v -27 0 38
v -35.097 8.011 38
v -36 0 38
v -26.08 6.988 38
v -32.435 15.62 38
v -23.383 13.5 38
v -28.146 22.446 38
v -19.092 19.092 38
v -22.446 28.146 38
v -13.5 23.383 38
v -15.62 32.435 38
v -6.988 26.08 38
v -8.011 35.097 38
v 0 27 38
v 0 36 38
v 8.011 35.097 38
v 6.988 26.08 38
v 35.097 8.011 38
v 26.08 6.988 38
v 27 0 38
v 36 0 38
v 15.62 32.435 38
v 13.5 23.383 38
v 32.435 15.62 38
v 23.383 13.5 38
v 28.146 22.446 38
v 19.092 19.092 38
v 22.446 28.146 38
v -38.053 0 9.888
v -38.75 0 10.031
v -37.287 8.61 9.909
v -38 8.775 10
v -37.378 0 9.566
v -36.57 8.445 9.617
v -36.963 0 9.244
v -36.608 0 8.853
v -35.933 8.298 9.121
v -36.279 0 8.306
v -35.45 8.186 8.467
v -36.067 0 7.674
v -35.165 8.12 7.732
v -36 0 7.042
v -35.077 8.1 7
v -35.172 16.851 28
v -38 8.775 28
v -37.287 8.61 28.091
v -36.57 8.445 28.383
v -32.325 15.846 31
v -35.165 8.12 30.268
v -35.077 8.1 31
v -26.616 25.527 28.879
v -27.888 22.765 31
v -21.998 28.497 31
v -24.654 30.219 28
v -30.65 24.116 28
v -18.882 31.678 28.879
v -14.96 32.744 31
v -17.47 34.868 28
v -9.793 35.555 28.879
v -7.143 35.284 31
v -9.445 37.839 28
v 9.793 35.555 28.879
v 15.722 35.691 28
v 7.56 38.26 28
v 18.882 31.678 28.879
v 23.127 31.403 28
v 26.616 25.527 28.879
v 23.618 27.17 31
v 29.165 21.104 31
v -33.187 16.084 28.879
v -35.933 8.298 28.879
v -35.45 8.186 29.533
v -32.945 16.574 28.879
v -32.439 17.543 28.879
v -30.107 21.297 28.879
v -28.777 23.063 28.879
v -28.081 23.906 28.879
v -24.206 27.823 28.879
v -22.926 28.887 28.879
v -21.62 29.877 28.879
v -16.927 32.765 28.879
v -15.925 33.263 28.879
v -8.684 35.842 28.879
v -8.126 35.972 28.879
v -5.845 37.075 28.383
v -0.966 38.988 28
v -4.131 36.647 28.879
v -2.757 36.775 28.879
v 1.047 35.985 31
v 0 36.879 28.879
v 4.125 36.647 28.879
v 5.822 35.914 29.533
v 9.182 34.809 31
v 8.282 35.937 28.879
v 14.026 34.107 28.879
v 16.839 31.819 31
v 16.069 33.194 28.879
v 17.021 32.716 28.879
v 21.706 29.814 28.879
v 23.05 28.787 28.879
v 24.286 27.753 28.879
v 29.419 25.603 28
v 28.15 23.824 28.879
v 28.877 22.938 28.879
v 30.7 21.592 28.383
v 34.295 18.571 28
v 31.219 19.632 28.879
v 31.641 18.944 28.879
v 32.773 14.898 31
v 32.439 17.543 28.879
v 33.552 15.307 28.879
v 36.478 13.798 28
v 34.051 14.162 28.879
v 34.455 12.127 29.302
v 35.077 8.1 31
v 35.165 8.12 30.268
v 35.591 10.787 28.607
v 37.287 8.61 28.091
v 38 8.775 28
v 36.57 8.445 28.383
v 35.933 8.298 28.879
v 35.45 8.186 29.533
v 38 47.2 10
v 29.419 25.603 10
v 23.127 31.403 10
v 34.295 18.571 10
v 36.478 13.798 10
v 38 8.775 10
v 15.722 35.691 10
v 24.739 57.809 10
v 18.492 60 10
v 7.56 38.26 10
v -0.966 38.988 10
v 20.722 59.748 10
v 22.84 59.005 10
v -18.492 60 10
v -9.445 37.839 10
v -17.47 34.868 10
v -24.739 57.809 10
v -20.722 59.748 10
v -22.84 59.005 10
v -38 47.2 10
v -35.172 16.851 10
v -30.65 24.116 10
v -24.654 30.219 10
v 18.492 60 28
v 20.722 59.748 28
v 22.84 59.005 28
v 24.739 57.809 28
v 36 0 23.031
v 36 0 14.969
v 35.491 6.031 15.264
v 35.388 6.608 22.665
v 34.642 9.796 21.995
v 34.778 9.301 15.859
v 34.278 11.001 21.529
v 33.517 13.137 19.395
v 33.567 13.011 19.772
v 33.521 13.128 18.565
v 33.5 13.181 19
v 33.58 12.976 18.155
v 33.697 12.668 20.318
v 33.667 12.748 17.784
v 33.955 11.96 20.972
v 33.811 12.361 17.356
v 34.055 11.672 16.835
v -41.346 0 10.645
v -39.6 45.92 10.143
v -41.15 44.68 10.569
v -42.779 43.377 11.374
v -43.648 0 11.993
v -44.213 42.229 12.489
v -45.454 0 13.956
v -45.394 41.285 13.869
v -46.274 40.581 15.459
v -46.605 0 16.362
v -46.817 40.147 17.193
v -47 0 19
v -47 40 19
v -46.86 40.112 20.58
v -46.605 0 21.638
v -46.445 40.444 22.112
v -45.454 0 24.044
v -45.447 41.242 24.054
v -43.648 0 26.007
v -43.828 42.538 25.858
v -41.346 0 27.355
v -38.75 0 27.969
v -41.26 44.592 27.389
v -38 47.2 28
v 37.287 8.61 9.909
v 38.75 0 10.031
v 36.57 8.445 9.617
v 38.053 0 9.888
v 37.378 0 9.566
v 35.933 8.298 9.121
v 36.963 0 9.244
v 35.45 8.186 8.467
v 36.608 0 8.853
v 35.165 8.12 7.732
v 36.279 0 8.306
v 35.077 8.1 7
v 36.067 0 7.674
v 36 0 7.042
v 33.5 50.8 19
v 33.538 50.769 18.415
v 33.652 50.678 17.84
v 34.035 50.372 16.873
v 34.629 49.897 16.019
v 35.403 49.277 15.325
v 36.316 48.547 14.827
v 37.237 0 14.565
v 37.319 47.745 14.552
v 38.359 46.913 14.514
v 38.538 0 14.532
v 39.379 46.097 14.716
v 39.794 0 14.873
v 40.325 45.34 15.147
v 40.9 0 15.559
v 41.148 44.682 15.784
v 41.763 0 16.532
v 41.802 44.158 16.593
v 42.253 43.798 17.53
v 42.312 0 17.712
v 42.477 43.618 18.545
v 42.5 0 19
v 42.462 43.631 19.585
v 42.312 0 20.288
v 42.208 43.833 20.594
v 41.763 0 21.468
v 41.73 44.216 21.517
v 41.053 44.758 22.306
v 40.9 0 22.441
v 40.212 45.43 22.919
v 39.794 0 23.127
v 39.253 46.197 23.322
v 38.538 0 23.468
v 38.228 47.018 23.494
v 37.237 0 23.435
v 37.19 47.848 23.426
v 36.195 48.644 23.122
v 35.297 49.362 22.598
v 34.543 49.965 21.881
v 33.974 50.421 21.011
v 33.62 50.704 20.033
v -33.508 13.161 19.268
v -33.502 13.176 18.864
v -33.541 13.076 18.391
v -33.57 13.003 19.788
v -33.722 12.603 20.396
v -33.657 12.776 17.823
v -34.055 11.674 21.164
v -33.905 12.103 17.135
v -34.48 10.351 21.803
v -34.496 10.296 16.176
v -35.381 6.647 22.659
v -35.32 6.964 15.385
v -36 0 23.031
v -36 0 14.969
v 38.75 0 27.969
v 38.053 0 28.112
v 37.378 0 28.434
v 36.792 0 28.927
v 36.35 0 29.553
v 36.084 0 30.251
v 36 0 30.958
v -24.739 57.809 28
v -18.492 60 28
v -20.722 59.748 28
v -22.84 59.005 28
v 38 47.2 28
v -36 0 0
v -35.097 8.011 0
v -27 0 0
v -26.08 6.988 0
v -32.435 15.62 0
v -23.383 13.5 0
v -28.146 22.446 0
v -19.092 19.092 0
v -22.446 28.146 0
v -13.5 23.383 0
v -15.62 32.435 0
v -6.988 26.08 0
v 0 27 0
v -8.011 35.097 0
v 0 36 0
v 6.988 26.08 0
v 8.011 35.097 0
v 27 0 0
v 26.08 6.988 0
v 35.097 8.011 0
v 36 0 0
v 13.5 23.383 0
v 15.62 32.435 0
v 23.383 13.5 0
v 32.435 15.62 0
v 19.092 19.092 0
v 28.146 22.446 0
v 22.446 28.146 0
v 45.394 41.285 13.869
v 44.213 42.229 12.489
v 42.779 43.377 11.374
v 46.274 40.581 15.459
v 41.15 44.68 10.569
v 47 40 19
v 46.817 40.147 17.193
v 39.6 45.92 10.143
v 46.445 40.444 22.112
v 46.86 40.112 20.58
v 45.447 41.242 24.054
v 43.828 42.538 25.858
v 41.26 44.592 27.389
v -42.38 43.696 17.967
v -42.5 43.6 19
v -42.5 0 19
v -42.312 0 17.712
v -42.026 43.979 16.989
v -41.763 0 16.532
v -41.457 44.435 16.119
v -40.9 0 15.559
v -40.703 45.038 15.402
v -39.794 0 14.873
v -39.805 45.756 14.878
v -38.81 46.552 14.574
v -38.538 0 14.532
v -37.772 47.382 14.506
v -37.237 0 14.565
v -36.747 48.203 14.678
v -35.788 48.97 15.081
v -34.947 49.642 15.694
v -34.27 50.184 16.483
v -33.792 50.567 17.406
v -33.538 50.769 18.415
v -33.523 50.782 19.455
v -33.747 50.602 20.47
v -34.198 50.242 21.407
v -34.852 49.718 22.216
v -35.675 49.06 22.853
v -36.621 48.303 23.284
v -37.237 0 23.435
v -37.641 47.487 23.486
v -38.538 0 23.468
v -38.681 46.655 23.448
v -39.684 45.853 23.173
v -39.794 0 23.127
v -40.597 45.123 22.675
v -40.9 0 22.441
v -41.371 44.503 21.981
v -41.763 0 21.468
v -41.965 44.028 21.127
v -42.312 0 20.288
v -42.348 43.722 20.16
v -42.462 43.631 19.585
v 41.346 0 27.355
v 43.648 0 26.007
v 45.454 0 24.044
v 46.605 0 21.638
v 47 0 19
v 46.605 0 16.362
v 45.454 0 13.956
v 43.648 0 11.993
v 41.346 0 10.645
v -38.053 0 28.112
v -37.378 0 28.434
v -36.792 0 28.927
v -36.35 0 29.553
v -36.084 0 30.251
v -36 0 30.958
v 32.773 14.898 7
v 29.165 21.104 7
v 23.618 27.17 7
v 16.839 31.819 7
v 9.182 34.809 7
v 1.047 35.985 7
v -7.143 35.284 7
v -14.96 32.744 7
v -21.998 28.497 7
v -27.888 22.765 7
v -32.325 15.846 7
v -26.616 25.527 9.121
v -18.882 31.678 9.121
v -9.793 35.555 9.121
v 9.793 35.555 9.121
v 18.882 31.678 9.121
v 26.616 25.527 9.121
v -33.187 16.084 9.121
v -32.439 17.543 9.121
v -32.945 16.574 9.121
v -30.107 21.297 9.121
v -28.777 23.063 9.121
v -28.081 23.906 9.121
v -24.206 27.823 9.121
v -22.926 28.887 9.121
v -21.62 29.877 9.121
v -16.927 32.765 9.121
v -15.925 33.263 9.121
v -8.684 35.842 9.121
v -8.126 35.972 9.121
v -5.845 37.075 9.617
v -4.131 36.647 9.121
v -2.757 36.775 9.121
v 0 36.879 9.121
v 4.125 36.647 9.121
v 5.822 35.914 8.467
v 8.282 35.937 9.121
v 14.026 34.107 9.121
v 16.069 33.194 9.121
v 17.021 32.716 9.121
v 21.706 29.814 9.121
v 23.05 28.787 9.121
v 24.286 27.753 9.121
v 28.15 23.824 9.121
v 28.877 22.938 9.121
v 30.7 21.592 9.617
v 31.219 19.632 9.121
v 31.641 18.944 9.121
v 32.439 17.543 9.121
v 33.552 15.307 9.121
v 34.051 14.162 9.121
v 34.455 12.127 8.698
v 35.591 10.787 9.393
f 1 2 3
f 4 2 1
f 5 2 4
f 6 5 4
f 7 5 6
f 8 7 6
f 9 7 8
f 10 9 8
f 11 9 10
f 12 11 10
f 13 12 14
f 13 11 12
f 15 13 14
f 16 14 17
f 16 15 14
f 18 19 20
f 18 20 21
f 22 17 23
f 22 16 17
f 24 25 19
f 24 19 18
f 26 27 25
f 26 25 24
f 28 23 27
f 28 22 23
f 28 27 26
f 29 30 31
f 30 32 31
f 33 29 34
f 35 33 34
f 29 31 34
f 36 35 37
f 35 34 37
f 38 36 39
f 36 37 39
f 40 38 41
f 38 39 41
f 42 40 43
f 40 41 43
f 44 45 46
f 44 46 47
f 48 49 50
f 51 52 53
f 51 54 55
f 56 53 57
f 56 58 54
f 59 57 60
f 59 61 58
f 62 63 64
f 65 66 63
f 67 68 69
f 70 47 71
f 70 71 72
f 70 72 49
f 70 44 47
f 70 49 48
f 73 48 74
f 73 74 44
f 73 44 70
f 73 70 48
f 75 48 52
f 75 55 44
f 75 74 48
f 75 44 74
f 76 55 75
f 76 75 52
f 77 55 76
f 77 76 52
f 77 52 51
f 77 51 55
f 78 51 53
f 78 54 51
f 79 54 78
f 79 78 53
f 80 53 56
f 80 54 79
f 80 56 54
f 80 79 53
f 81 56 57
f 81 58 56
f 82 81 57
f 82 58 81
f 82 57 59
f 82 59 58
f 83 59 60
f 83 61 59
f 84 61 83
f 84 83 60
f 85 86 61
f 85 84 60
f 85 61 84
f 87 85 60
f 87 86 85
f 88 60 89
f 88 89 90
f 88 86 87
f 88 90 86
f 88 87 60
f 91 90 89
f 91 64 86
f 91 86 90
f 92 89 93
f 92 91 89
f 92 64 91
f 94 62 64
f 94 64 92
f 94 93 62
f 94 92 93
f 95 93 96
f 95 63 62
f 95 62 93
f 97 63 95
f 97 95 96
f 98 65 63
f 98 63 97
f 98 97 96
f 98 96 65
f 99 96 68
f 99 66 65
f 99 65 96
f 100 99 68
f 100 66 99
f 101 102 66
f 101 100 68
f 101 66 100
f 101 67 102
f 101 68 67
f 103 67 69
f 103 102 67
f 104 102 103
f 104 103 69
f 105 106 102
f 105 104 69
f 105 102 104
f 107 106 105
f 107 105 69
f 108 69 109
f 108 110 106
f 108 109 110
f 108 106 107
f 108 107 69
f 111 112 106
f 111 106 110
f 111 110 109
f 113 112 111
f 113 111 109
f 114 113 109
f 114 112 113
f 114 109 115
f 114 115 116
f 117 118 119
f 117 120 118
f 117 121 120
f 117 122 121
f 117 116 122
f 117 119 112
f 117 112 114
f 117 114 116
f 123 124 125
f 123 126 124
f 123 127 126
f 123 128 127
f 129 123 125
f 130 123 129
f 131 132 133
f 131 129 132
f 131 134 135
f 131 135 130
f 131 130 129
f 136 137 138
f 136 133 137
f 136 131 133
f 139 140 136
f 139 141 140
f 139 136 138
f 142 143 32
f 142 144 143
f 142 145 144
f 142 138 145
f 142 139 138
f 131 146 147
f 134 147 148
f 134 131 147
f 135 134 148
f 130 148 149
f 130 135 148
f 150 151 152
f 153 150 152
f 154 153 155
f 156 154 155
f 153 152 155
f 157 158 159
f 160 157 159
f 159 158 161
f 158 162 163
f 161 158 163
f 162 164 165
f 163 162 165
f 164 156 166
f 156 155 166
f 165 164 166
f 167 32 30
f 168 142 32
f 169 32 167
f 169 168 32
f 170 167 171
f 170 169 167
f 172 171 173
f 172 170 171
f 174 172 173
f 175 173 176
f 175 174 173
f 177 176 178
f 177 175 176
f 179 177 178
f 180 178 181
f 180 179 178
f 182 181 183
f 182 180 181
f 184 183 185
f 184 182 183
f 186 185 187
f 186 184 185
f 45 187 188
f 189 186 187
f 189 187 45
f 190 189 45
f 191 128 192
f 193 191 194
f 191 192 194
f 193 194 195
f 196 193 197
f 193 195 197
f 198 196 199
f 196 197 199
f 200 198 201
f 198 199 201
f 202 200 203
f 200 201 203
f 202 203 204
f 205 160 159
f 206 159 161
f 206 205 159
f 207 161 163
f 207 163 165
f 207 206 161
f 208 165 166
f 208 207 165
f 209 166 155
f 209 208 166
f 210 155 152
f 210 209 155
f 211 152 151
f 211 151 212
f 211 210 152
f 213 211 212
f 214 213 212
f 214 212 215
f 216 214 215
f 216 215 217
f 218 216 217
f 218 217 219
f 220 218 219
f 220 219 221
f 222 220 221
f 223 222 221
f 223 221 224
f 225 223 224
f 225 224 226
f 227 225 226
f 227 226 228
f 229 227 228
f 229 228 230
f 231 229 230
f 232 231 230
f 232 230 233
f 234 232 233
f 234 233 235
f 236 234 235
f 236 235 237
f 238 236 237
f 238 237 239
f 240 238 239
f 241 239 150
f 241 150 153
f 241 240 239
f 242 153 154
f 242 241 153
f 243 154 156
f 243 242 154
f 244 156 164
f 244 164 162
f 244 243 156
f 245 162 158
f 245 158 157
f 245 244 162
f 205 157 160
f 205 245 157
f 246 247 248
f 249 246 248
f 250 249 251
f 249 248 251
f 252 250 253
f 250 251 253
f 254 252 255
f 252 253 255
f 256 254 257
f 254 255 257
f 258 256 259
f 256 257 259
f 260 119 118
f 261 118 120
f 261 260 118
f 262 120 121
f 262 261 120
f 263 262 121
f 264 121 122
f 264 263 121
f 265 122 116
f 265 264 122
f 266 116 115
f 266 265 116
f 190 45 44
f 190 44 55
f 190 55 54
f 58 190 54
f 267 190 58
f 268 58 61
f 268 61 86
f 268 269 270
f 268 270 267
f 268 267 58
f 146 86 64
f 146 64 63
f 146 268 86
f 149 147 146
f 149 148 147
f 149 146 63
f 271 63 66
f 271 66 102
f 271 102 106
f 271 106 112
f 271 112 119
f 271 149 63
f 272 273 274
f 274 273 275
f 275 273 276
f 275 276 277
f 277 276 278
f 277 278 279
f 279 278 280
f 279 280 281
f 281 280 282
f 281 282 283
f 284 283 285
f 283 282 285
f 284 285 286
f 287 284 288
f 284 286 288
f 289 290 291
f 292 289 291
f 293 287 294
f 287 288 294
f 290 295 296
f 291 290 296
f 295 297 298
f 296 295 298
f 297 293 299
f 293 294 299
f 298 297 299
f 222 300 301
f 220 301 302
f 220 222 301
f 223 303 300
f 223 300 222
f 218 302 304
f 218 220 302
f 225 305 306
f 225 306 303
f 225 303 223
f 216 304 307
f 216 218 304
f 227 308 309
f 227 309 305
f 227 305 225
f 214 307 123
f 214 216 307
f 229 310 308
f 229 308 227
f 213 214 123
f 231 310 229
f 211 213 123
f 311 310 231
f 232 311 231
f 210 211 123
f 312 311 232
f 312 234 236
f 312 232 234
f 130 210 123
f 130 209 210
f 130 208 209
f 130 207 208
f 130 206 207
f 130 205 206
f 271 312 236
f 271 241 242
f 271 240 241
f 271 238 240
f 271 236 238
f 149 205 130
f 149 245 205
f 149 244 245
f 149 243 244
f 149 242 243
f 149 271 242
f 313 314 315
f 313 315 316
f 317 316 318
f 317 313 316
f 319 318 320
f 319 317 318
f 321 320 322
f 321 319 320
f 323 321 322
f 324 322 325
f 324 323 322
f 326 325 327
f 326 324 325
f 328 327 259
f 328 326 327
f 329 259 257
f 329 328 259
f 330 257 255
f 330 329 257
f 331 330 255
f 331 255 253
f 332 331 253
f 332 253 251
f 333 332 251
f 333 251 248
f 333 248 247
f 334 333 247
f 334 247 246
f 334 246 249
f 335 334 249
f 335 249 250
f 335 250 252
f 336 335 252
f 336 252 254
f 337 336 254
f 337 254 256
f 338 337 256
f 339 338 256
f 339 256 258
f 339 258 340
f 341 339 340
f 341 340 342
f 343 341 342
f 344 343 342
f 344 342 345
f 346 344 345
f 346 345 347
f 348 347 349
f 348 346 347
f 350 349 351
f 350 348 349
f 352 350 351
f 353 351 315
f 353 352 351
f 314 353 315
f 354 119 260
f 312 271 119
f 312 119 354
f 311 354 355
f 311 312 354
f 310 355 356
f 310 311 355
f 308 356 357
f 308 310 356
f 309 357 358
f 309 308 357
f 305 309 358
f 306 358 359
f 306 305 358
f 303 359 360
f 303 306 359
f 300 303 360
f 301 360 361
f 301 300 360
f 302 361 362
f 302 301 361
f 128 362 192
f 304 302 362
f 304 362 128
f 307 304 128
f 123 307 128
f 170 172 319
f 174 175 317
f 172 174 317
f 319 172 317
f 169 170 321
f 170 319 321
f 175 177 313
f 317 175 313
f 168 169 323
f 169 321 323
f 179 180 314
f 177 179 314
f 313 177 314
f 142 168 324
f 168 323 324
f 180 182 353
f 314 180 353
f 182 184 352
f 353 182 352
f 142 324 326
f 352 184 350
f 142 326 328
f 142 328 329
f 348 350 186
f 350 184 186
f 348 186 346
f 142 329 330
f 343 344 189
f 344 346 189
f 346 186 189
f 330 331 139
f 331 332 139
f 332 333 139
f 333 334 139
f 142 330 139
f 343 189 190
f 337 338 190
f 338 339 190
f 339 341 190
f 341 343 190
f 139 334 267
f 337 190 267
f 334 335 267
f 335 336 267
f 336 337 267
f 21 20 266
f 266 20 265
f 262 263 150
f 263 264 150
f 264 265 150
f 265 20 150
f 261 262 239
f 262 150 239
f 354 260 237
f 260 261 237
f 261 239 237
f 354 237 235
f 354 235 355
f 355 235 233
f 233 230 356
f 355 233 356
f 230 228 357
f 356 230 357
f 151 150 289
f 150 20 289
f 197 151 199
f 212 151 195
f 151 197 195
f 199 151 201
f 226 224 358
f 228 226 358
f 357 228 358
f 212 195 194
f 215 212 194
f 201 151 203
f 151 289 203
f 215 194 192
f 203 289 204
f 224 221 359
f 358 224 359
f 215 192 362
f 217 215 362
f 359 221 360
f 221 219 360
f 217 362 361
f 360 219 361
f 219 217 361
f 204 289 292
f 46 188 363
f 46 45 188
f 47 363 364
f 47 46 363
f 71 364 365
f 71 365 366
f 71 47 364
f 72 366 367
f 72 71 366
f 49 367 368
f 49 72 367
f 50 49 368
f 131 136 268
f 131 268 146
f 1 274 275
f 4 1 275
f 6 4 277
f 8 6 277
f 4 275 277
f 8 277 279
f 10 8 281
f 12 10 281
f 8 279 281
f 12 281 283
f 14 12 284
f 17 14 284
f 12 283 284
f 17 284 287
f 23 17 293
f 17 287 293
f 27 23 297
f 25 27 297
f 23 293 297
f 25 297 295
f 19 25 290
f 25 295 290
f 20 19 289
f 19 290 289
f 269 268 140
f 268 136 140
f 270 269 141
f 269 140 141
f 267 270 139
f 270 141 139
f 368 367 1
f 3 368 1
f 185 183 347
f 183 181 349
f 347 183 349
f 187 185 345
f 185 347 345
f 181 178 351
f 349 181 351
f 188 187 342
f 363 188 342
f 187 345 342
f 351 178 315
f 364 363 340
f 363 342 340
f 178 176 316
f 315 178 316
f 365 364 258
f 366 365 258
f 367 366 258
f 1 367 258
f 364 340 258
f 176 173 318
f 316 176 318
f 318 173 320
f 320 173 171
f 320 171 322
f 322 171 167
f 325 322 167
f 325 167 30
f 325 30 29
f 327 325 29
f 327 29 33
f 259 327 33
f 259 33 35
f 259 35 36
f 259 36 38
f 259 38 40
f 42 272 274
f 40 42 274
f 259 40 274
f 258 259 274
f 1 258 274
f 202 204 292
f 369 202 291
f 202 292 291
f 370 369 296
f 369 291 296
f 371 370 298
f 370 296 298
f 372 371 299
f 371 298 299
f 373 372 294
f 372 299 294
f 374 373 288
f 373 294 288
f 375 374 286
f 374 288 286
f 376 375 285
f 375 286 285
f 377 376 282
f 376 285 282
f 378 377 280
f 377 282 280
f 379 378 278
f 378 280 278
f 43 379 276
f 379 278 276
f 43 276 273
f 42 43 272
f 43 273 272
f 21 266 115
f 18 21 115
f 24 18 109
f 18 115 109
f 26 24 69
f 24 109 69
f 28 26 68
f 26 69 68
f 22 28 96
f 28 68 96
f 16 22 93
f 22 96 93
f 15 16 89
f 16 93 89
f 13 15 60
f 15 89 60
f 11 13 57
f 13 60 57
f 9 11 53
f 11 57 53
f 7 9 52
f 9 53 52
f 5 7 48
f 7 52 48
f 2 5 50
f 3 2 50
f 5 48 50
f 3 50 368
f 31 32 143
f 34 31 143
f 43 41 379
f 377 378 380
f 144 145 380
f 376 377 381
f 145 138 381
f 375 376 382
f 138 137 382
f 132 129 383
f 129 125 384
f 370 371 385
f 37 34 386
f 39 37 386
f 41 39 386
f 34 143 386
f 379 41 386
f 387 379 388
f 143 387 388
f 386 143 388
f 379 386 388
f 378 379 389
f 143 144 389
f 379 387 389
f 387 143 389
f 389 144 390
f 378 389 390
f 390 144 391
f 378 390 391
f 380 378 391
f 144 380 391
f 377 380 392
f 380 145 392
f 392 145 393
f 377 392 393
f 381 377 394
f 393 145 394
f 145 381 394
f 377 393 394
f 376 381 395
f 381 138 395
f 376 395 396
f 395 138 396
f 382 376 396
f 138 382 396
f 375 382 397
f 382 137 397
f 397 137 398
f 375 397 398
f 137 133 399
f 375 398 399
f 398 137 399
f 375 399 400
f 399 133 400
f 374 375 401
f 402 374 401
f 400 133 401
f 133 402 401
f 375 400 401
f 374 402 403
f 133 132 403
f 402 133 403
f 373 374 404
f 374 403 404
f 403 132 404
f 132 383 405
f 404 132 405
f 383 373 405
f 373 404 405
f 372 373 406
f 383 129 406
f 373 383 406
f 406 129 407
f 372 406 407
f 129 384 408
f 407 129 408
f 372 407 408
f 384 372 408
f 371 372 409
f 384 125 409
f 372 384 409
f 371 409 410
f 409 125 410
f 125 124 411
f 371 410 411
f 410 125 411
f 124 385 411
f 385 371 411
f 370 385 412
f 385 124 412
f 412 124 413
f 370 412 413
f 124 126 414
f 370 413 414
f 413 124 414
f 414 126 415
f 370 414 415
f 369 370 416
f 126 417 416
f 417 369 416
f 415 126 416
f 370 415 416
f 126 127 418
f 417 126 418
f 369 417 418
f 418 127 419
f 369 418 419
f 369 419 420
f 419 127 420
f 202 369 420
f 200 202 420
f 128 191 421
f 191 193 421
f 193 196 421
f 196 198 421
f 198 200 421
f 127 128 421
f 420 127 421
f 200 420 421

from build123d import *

# Parameters (mm, degrees)
BOSS_EXTRUDE1_DEPTH = 38
SKETCH3_R           = 4.5
BOSS_EXTRUDE2_DEPTH = 60
CUT_EXTRUDE1_DEPTH  = 60
CUT_EXTRUDE2_DEPTH  = 60
FILLET1_R           = 10
FILLET2_R           = 3


with BuildPart() as part:
    # Sketch2 → Boss-Extrude1 (new body)
    with BuildSketch(Plane.XY):
        with BuildLine():
            Line((-36, 0), (-27, 0))
            ThreePointArc((-27, 0), (0, 27), (27, 0))
            Line((27, 0), (36, 0))
            ThreePointArc((36, 0), (0, 36), (-36, 0))
        make_face()
    extrude(amount=BOSS_EXTRUDE1_DEPTH)

    # Sketch3 → Boss-Extrude2 (add)
    with BuildSketch(Plane(origin=(0, 60, 0), x_dir=(-1, 0, 0), z_dir=(0, -1, 0))):
        with BuildLine():
            Line((38, -28), (-38, -28))
            ThreePointArc((-38, -28), (-47, -19), (-38, -10))
            Line((-38, -10), (38, -10))
            ThreePointArc((38, -10), (47, -19), (38, -28))
        make_face()
        with Locations((38, -19)):
            Circle(SKETCH3_R, mode=Mode.SUBTRACT)
        with Locations((-38, -19)):
            Circle(SKETCH3_R, mode=Mode.SUBTRACT)
    extrude(amount=BOSS_EXTRUDE2_DEPTH)

    # Sketch4 → Cut-Extrude1 (cut)
    with BuildSketch(Plane.XY.offset(28)):
        with BuildLine():
            Line((-27, 0), (27, 0))
            ThreePointArc((27, 0), (0, 27), (-27, 0))
        make_face()
    extrude(amount=-CUT_EXTRUDE1_DEPTH, mode=Mode.SUBTRACT)

    # Sketch5 → Cut-Extrude2 (cut)
    with BuildSketch(Plane.XY.offset(28)):
        Polygon((-47, 40), (-22, 60), (-47, 60), align=None)
        Polygon((47, 40), (22, 60), (47, 60), align=None)
    extrude(amount=-CUT_EXTRUDE2_DEPTH, mode=Mode.SUBTRACT)

    # Fillet1
    fillet1_edges = [part.edges().sort_by_distance(p)[0] for p in [
        (-22, 60, 19),
        (22, 60, 19),
    ]]
    fillet(fillet1_edges, radius=FILLET1_R)

    # Fillet2
    fillet2_edges = [part.edges().sort_by_distance(p)[0] for p in [
        (0, 36, 10),
        (0, 36, 28),
    ]]
    fillet(fillet2_edges, radius=FILLET2_R)


solid = part.part
